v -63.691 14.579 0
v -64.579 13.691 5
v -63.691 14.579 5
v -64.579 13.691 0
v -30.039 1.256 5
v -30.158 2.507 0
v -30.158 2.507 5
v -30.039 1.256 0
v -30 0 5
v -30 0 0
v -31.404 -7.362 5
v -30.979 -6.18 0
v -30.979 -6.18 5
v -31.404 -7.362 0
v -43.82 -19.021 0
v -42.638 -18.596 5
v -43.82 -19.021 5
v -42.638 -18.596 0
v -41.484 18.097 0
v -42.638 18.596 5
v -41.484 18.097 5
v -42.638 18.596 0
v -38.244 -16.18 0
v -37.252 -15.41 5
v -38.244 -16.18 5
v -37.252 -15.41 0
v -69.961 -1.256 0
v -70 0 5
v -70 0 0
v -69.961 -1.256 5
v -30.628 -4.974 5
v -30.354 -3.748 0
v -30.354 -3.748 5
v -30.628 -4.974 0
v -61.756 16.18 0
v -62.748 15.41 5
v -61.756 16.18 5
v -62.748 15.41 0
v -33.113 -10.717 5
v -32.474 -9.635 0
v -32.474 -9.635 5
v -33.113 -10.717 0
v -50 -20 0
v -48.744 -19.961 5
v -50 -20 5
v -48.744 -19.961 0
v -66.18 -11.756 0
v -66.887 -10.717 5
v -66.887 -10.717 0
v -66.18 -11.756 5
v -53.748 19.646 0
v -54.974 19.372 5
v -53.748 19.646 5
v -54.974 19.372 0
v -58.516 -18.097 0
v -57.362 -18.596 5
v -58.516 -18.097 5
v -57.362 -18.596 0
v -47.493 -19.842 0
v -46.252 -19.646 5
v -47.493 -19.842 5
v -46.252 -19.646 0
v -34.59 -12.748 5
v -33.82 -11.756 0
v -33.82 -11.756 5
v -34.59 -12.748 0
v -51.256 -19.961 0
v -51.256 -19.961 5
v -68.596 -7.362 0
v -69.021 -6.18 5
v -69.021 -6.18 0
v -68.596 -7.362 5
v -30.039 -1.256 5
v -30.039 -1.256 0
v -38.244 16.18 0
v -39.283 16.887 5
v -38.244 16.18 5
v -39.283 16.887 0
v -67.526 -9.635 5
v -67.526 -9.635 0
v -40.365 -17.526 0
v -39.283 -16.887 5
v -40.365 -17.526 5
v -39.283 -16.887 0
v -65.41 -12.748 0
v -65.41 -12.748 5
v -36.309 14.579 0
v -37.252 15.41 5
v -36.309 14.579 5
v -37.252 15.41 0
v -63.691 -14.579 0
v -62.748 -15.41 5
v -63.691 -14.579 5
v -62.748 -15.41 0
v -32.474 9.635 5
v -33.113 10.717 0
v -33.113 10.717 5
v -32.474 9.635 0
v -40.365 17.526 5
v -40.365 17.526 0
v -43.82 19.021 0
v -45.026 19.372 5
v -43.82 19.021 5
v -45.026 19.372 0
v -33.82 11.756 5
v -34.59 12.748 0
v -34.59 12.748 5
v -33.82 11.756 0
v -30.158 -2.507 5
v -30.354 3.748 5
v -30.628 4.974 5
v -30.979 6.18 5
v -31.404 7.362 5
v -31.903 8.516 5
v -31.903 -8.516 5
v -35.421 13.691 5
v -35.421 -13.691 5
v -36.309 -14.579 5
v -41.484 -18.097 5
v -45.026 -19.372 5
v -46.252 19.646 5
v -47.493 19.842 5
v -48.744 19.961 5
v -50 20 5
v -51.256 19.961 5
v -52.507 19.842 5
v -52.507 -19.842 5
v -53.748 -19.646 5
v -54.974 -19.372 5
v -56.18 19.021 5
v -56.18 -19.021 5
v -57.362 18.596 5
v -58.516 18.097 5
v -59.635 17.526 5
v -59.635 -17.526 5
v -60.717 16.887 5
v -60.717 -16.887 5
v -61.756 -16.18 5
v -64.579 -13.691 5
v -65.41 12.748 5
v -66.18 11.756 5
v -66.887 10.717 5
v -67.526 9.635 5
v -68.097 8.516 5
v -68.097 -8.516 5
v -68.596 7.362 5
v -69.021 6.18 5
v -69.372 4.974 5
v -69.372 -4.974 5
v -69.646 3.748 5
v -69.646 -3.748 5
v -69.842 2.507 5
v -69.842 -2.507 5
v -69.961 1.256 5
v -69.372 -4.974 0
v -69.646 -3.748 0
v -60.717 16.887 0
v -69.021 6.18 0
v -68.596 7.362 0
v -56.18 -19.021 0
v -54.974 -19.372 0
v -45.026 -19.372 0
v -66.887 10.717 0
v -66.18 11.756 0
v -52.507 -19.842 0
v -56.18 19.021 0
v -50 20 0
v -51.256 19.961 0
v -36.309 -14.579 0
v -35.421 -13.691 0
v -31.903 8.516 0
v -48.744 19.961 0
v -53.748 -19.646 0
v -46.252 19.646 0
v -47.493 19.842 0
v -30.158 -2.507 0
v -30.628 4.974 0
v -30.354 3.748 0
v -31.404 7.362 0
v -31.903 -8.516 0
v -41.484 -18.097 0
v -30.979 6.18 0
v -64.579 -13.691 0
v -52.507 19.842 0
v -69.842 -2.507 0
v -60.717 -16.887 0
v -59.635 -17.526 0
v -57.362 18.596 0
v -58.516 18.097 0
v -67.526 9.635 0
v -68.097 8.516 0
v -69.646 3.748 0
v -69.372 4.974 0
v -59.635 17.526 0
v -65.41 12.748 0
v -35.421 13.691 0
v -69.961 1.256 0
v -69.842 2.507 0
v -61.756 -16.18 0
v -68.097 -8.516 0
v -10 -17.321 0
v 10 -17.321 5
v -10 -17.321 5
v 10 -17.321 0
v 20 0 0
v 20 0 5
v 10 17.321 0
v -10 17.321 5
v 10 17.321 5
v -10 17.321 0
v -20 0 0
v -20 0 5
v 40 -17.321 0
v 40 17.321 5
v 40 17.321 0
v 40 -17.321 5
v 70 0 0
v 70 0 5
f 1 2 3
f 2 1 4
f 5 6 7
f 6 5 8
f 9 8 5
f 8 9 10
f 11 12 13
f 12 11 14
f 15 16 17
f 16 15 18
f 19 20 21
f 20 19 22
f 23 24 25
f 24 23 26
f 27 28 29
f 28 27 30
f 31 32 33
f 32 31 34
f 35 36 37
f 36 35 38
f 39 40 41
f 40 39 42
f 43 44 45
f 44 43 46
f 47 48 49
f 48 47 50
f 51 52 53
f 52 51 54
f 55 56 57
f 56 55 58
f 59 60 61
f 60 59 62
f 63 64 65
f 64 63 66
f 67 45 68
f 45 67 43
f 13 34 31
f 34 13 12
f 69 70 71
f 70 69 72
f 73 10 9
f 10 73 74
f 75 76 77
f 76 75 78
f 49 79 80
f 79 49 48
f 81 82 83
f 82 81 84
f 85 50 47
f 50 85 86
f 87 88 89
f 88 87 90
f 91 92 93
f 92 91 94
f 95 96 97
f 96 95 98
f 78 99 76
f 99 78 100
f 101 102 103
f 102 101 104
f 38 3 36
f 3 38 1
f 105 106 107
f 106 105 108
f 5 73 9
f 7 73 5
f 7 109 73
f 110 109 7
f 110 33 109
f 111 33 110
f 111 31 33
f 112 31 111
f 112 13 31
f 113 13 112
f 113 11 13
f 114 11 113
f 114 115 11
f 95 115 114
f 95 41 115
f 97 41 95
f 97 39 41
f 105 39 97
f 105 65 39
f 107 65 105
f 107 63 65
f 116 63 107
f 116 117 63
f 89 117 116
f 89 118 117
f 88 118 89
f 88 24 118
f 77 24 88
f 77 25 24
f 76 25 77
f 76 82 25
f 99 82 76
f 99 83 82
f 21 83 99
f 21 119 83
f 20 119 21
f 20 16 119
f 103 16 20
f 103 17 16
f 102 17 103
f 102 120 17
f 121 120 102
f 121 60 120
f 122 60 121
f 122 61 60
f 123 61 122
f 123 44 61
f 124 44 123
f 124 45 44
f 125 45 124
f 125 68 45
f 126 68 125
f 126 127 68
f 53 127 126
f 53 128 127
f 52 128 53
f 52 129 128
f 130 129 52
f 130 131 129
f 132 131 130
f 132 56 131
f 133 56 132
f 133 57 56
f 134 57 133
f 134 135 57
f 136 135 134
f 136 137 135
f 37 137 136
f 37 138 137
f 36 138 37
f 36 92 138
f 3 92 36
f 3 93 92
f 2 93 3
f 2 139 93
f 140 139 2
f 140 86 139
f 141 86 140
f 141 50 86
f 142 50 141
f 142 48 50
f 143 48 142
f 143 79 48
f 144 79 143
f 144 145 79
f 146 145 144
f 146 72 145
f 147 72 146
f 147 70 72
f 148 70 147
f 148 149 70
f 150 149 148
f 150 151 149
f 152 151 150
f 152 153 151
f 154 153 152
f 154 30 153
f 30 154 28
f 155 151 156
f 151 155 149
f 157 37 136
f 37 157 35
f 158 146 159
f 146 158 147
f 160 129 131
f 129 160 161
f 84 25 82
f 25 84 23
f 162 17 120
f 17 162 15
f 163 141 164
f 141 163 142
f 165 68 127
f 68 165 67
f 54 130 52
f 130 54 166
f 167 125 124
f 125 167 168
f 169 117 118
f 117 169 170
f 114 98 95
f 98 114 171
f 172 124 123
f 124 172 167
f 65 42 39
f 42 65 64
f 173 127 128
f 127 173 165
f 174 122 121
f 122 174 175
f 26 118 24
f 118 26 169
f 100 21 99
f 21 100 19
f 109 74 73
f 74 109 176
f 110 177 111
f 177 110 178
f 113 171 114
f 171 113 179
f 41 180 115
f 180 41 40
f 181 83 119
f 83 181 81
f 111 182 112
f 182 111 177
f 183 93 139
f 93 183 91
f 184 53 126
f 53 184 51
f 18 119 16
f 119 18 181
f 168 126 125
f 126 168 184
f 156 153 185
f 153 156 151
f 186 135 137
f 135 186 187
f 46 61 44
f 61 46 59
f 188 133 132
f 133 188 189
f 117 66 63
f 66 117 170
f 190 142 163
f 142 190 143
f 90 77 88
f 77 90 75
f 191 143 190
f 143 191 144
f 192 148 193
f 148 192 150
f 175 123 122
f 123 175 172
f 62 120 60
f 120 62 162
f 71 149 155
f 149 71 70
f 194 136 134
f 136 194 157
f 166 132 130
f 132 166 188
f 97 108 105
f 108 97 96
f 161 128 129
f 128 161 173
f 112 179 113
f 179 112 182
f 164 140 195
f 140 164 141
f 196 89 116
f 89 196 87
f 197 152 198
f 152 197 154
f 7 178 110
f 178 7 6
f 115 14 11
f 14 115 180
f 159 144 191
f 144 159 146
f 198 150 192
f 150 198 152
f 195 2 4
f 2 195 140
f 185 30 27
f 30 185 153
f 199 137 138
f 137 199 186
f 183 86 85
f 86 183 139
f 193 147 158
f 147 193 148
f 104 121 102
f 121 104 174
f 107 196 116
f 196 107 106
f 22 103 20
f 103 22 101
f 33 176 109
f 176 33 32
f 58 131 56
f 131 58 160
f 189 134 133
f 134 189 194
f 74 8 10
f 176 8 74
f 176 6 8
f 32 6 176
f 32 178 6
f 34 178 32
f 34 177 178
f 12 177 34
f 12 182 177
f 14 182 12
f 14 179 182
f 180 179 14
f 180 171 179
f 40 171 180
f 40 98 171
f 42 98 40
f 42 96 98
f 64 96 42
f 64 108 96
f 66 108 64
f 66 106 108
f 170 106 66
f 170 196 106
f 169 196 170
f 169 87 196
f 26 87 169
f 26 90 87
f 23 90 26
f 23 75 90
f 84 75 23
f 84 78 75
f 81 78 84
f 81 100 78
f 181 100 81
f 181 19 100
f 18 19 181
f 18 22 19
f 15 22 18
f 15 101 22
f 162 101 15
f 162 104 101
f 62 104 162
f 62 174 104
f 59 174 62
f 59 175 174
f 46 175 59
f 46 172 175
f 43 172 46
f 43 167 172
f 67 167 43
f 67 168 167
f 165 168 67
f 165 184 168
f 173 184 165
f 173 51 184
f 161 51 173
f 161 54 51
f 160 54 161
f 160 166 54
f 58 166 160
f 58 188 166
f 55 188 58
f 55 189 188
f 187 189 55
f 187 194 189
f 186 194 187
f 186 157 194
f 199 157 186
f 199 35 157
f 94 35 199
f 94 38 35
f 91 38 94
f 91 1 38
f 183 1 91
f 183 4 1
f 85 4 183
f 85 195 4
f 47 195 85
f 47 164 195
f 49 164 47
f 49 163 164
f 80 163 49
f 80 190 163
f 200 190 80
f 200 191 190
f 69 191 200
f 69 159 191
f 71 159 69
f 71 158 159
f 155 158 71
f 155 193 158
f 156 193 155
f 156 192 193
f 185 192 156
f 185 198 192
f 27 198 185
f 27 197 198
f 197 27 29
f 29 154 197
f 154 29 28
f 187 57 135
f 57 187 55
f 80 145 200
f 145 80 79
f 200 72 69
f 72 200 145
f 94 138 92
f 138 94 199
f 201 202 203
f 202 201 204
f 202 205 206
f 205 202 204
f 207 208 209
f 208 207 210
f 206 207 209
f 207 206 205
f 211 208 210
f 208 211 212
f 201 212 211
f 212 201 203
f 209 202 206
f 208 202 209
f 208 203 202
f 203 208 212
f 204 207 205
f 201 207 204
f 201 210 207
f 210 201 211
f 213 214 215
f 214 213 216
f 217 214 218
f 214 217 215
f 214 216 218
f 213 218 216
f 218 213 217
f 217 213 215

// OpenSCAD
//-- Moneda
translate([-50,0,0])
    cylinder(r=40/2, h=5, $fn=100);

//-- Hexágono regular
cylinder(r=40/2, h=5, $fn=6);

//-- Triángulo equilatero
translate([50,0,0])
    cylinder(r=40/2, h=5, $fn=3);
